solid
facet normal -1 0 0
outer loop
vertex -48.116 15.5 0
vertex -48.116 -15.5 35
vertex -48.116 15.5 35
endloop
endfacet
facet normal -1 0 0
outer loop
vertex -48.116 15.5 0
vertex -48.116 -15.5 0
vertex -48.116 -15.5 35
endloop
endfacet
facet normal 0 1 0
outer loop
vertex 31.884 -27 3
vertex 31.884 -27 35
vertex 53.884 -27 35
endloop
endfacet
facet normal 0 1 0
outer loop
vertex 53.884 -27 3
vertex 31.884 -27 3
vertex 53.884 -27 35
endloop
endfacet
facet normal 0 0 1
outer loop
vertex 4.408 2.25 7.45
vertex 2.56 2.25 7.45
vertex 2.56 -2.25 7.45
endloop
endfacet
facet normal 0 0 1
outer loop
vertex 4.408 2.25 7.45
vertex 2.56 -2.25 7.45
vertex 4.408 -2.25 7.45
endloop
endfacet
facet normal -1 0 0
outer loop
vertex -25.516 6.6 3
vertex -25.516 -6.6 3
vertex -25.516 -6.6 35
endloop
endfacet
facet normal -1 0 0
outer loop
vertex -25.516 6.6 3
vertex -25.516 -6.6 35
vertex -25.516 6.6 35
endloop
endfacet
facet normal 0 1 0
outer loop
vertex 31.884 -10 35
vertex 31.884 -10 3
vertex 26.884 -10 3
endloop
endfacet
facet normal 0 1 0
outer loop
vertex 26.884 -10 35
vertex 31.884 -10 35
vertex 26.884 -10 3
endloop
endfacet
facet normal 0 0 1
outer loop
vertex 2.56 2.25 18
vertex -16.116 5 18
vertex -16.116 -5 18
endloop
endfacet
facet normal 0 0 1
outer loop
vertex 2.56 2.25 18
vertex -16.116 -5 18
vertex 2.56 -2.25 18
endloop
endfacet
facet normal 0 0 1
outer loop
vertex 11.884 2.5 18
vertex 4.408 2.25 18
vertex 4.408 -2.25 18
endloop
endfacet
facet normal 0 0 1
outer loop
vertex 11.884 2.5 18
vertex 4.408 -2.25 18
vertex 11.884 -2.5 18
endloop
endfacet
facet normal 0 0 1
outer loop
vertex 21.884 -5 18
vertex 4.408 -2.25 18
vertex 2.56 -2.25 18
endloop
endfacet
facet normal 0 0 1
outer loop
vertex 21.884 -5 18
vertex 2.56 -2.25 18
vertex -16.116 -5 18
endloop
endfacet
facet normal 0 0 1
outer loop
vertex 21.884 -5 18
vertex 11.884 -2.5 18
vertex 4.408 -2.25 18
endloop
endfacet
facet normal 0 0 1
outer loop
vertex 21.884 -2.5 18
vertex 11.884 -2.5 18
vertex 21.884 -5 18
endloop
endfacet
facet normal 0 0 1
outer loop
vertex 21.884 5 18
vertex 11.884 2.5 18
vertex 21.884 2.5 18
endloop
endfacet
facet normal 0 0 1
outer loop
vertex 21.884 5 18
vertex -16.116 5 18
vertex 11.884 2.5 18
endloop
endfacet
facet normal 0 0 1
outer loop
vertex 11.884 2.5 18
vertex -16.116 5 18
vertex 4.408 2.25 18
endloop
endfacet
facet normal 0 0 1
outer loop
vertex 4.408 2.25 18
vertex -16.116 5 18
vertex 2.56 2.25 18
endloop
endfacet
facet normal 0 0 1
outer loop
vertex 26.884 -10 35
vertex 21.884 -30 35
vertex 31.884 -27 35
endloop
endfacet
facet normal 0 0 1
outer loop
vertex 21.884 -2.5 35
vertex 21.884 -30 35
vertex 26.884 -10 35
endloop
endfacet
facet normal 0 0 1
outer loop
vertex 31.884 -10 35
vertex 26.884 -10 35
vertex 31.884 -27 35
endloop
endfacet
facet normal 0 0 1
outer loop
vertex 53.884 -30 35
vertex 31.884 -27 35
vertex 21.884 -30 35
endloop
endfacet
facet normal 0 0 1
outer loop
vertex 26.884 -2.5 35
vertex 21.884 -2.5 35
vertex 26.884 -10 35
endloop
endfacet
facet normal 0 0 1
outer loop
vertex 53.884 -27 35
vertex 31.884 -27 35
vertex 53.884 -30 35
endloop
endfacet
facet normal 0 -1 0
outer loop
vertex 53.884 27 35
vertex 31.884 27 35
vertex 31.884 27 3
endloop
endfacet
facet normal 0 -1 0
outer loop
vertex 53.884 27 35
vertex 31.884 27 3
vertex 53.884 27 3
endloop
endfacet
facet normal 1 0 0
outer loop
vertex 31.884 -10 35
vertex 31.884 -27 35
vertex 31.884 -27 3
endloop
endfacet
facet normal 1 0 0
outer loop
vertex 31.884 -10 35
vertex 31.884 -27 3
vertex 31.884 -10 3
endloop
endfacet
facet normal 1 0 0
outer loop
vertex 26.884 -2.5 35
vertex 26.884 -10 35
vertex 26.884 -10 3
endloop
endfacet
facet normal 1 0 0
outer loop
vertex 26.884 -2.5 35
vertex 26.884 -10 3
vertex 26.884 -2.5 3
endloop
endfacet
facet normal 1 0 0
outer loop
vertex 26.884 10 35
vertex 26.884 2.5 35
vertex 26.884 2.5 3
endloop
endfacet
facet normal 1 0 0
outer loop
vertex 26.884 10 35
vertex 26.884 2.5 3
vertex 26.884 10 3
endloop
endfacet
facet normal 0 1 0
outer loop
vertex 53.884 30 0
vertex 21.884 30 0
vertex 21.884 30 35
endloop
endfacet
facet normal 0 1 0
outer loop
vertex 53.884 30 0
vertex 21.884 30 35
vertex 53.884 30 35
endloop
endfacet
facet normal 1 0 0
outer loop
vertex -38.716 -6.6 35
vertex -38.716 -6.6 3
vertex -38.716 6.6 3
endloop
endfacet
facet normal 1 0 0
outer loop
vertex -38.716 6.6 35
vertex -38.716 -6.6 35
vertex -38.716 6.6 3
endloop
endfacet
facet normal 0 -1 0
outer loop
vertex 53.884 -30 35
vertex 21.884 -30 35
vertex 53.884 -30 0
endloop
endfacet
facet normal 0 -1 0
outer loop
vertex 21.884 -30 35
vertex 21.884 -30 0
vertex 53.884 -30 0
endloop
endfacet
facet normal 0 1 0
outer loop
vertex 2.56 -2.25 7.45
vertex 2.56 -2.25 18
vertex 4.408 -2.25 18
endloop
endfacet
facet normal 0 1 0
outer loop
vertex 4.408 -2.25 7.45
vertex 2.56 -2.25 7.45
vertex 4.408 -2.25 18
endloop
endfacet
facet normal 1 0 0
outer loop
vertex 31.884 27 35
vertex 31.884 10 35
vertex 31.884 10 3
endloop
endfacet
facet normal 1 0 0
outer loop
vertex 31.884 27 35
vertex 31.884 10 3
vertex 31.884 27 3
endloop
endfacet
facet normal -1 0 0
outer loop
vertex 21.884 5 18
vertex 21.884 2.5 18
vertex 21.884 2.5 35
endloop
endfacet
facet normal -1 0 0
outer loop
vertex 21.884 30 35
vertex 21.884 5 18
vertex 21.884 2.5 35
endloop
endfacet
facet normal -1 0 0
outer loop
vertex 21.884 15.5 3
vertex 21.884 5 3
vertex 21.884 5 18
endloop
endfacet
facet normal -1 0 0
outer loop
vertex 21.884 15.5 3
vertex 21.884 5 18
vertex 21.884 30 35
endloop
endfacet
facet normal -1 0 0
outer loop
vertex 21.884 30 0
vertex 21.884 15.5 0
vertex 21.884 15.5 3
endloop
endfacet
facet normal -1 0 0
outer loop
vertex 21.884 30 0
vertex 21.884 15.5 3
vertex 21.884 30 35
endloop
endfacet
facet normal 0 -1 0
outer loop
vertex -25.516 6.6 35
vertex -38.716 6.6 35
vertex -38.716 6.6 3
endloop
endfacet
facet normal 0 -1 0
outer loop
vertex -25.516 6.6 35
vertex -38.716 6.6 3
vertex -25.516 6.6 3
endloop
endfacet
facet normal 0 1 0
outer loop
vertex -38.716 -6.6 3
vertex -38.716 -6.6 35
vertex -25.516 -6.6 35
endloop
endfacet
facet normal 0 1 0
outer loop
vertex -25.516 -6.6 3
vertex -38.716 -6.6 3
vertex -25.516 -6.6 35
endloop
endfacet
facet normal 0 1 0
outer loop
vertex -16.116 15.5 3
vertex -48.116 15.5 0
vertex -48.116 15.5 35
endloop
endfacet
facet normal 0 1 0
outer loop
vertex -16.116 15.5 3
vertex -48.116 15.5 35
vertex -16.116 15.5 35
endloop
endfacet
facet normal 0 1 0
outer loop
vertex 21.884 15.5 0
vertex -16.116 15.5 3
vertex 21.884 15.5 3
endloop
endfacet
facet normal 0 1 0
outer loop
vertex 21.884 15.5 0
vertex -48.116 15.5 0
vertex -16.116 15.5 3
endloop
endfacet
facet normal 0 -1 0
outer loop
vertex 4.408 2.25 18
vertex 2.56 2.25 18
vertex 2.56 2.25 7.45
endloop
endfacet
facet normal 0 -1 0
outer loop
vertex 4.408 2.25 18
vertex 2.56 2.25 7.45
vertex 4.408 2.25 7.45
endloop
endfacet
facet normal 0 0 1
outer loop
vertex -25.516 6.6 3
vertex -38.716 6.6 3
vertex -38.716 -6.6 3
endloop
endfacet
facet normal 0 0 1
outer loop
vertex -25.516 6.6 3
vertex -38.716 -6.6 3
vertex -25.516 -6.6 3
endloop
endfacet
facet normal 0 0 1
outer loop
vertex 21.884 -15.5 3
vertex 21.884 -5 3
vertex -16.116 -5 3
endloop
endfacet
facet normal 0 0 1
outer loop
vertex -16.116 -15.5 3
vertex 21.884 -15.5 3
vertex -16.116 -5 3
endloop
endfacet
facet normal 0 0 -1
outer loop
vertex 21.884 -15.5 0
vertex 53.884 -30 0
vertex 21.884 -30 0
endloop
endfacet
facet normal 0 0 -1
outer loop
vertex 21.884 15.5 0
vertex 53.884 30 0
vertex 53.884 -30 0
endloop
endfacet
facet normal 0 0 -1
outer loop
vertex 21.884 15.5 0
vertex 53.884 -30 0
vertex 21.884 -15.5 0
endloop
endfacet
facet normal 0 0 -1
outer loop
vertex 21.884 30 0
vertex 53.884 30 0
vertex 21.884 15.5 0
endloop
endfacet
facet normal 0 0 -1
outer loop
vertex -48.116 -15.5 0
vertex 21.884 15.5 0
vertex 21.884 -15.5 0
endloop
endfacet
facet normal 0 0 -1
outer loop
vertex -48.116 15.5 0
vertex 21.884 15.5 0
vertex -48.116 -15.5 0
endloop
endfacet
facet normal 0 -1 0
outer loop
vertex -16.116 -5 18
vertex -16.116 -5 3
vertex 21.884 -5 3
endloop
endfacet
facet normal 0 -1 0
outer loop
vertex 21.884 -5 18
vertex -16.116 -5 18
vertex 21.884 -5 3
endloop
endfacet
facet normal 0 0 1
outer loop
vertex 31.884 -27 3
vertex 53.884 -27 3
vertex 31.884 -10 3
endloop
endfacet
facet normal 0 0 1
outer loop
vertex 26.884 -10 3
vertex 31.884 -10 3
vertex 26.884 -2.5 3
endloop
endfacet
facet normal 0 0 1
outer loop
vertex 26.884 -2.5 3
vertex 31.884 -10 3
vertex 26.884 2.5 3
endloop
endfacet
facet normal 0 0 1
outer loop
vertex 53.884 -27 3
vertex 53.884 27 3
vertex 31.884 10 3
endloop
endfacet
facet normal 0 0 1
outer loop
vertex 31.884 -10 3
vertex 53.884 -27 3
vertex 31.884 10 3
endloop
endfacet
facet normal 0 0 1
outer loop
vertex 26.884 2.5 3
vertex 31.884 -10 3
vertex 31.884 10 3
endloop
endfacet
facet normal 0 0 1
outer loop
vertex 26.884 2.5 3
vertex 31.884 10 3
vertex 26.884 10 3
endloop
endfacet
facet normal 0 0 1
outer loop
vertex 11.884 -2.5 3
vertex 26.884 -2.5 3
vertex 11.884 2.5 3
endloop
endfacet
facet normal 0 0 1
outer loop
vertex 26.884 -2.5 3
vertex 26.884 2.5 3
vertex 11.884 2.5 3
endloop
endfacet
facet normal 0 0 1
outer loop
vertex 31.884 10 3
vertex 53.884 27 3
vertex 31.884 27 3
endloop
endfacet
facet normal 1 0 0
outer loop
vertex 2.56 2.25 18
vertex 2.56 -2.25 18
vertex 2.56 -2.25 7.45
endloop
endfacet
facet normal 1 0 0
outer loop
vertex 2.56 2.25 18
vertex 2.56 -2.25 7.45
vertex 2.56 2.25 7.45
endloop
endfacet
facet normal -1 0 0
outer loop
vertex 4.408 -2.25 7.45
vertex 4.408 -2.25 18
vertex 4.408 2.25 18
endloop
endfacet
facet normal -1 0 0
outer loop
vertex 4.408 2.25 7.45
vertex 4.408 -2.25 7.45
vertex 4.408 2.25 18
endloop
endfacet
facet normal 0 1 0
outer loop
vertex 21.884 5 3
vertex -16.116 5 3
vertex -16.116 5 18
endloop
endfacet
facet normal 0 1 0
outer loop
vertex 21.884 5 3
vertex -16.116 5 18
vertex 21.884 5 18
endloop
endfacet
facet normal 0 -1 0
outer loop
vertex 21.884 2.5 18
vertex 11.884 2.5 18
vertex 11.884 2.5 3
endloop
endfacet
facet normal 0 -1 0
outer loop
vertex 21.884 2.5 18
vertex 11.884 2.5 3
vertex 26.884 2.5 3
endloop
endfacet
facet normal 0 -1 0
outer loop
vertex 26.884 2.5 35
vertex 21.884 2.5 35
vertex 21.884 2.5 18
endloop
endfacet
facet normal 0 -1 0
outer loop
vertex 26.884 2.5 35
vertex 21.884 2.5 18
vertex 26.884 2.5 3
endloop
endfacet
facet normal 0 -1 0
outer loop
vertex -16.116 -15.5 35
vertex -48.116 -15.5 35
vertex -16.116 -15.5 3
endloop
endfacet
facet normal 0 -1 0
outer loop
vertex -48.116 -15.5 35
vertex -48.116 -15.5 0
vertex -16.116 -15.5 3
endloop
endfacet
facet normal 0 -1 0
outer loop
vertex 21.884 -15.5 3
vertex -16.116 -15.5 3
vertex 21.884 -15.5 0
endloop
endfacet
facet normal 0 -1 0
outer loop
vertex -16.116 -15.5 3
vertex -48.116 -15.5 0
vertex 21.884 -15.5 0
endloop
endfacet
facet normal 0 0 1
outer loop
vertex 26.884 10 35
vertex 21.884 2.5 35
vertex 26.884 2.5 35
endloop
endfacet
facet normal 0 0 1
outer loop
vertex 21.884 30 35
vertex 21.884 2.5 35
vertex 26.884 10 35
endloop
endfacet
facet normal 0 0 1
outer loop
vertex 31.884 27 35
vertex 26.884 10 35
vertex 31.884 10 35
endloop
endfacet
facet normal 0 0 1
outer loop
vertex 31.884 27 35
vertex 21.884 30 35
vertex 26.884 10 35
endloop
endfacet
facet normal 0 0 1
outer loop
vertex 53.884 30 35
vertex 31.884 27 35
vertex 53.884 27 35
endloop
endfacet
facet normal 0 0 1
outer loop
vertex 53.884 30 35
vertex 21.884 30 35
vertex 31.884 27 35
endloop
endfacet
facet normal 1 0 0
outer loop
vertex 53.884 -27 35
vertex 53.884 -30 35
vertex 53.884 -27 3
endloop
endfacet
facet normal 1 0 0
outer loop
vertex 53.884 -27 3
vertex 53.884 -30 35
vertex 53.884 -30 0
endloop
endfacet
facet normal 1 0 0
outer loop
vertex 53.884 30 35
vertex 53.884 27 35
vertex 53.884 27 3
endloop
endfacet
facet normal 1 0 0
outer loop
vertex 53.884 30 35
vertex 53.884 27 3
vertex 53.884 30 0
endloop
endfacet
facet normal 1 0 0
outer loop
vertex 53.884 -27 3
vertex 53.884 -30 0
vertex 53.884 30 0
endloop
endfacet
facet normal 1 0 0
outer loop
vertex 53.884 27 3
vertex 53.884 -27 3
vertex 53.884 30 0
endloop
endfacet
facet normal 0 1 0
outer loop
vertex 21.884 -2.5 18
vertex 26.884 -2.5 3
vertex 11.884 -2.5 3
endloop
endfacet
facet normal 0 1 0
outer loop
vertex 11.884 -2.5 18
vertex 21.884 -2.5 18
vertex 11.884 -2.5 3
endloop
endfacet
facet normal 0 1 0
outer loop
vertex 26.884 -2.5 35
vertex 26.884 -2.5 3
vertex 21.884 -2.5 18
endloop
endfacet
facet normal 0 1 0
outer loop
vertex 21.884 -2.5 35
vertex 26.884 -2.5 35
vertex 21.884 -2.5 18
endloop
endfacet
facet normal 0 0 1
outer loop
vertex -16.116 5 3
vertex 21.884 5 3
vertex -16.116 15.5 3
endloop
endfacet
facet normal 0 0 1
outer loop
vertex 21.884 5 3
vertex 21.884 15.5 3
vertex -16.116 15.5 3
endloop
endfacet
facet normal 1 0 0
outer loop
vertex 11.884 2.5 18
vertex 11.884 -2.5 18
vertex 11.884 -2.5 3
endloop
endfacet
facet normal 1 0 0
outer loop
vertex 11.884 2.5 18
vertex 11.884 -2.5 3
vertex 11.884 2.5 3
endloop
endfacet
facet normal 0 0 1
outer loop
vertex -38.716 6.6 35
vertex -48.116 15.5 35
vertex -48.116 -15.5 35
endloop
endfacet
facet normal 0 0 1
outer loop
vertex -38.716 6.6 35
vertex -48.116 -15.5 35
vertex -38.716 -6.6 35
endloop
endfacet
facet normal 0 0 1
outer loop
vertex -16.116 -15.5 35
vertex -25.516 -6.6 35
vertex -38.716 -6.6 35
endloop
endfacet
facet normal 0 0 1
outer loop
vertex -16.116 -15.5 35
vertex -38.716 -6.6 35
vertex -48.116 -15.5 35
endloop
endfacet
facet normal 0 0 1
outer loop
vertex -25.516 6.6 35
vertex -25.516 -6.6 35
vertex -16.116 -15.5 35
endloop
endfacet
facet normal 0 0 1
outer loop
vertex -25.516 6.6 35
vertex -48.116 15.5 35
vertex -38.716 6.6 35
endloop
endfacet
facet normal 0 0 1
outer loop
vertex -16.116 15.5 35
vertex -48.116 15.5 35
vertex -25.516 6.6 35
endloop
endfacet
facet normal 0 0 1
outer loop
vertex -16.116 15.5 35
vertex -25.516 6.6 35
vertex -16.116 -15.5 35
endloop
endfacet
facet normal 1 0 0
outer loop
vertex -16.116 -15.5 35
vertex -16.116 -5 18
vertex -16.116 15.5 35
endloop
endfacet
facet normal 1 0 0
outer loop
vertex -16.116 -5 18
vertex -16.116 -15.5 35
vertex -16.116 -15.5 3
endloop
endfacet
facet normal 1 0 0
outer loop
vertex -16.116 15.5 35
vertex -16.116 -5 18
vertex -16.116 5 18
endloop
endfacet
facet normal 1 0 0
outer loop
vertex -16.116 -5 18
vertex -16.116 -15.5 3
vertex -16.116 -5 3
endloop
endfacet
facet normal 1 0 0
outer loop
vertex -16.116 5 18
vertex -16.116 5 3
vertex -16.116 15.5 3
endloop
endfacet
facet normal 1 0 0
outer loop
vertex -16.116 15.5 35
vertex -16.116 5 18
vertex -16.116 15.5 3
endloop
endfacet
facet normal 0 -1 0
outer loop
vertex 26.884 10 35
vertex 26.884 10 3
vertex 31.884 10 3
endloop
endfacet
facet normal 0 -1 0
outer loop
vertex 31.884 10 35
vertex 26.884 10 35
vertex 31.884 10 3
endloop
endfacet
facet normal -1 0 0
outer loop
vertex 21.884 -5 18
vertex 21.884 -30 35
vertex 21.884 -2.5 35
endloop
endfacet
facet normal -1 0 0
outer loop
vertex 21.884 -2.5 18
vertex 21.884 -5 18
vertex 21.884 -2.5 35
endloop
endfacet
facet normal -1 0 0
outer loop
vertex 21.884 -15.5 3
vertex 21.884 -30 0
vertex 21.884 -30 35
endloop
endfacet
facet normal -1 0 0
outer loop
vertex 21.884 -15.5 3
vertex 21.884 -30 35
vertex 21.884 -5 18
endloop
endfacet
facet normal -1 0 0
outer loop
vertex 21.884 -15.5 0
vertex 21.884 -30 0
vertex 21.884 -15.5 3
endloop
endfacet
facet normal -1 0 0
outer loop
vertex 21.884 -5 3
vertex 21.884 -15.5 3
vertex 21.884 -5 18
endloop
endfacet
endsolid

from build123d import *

# Parameters (mm, degrees)
PAD_DEPTH       = 3
SKETCH001_W     = 32
SKETCH001_H     = 60
PAD001_DEPTH    = 32
SKETCH002_W     = 22
SKETCH002_H     = 54
POCKET_DEPTH    = 32
SKETCH003_W     = 38
SKETCH003_H     = 10
PAD002_DEPTH    = 15
POCKET001_DEPTH = 32
SKETCH005_W     = 32
SKETCH005_H     = 31
PAD003_DEPTH    = 32
SKETCH006_W     = 13.2
SKETCH006_H     = 13.2
POCKET002_DEPTH = 32
SKETCH007_W     = 1.848
SKETCH007_H     = 4.499
POCKET003_DEPTH = 10.55


with BuildPart() as part:
    # Sketch → Pad (new body)
    with BuildSketch(Plane.XY):
        Polygon((-48.115829, 15.5), (21.884171, 15.5), (21.884171, 30), (53.884171, 30), (53.884171, -30), (21.884171, -30), (21.884171, -15.5), (-48.115829, -15.5), align=None)
    extrude(amount=PAD_DEPTH)

    # Sketch001 (on Face10 of Pad) → Pad001 (join)
    with BuildSketch(Plane.XY.offset(3)):
        with Locations((37.884171, 0)):
            Rectangle(SKETCH001_W, SKETCH001_H)
    extrude(amount=PAD001_DEPTH)

    # Sketch002 (on Face14 of Pad001) → Pocket (cut)
    with BuildSketch(Plane.XY.offset(35)):
        with Locations((42.884171, 0)):
            Rectangle(SKETCH002_W, SKETCH002_H)
    extrude(amount=-POCKET_DEPTH, mode=Mode.SUBTRACT)

    # Sketch003 (on Face5 of Pocket) → Pad002 (join)
    with BuildSketch(Plane.XY.offset(3)):
        with Locations((2.884171, 0)):
            Rectangle(SKETCH003_W, SKETCH003_H)
    extrude(amount=PAD002_DEPTH)

    # Sketch004 (on Face17 of Pad002) → Pocket001 (cut)
    with BuildSketch(Plane.XY.offset(35)):
        Polygon((31.884171, 10), (31.884171, -10), (26.884171, -10), (26.884171, -2.5), (11.884171, -2.5), (11.884171, 2.5), (26.884171, 2.5), (26.884171, 10), align=None)
    extrude(amount=-POCKET001_DEPTH, mode=Mode.SUBTRACT)

    # Sketch005 (on Face5 of Pocket001) → Pad003 (join)
    with BuildSketch(Plane.XY.offset(3)):
        with Locations((-32.115829, 0)):
            Rectangle(SKETCH005_W, SKETCH005_H)
    extrude(amount=PAD003_DEPTH)

    # Sketch006 (on Face15 of Pad003) → Pocket002 (cut)
    with BuildSketch(Plane.XY.offset(35)):
        with Locations((-32.115829, 0)):
            Rectangle(SKETCH006_W, SKETCH006_H)
    extrude(amount=-POCKET002_DEPTH, mode=Mode.SUBTRACT)

    # Sketch007 (on Face21 of Pocket002) → Pocket003 (cut)
    with BuildSketch(Plane.XY.offset(18)):
        with Locations((3.484171, 0)):
            Rectangle(SKETCH007_W, SKETCH007_H)
    extrude(amount=-POCKET003_DEPTH, mode=Mode.SUBTRACT)


solid = part.part
